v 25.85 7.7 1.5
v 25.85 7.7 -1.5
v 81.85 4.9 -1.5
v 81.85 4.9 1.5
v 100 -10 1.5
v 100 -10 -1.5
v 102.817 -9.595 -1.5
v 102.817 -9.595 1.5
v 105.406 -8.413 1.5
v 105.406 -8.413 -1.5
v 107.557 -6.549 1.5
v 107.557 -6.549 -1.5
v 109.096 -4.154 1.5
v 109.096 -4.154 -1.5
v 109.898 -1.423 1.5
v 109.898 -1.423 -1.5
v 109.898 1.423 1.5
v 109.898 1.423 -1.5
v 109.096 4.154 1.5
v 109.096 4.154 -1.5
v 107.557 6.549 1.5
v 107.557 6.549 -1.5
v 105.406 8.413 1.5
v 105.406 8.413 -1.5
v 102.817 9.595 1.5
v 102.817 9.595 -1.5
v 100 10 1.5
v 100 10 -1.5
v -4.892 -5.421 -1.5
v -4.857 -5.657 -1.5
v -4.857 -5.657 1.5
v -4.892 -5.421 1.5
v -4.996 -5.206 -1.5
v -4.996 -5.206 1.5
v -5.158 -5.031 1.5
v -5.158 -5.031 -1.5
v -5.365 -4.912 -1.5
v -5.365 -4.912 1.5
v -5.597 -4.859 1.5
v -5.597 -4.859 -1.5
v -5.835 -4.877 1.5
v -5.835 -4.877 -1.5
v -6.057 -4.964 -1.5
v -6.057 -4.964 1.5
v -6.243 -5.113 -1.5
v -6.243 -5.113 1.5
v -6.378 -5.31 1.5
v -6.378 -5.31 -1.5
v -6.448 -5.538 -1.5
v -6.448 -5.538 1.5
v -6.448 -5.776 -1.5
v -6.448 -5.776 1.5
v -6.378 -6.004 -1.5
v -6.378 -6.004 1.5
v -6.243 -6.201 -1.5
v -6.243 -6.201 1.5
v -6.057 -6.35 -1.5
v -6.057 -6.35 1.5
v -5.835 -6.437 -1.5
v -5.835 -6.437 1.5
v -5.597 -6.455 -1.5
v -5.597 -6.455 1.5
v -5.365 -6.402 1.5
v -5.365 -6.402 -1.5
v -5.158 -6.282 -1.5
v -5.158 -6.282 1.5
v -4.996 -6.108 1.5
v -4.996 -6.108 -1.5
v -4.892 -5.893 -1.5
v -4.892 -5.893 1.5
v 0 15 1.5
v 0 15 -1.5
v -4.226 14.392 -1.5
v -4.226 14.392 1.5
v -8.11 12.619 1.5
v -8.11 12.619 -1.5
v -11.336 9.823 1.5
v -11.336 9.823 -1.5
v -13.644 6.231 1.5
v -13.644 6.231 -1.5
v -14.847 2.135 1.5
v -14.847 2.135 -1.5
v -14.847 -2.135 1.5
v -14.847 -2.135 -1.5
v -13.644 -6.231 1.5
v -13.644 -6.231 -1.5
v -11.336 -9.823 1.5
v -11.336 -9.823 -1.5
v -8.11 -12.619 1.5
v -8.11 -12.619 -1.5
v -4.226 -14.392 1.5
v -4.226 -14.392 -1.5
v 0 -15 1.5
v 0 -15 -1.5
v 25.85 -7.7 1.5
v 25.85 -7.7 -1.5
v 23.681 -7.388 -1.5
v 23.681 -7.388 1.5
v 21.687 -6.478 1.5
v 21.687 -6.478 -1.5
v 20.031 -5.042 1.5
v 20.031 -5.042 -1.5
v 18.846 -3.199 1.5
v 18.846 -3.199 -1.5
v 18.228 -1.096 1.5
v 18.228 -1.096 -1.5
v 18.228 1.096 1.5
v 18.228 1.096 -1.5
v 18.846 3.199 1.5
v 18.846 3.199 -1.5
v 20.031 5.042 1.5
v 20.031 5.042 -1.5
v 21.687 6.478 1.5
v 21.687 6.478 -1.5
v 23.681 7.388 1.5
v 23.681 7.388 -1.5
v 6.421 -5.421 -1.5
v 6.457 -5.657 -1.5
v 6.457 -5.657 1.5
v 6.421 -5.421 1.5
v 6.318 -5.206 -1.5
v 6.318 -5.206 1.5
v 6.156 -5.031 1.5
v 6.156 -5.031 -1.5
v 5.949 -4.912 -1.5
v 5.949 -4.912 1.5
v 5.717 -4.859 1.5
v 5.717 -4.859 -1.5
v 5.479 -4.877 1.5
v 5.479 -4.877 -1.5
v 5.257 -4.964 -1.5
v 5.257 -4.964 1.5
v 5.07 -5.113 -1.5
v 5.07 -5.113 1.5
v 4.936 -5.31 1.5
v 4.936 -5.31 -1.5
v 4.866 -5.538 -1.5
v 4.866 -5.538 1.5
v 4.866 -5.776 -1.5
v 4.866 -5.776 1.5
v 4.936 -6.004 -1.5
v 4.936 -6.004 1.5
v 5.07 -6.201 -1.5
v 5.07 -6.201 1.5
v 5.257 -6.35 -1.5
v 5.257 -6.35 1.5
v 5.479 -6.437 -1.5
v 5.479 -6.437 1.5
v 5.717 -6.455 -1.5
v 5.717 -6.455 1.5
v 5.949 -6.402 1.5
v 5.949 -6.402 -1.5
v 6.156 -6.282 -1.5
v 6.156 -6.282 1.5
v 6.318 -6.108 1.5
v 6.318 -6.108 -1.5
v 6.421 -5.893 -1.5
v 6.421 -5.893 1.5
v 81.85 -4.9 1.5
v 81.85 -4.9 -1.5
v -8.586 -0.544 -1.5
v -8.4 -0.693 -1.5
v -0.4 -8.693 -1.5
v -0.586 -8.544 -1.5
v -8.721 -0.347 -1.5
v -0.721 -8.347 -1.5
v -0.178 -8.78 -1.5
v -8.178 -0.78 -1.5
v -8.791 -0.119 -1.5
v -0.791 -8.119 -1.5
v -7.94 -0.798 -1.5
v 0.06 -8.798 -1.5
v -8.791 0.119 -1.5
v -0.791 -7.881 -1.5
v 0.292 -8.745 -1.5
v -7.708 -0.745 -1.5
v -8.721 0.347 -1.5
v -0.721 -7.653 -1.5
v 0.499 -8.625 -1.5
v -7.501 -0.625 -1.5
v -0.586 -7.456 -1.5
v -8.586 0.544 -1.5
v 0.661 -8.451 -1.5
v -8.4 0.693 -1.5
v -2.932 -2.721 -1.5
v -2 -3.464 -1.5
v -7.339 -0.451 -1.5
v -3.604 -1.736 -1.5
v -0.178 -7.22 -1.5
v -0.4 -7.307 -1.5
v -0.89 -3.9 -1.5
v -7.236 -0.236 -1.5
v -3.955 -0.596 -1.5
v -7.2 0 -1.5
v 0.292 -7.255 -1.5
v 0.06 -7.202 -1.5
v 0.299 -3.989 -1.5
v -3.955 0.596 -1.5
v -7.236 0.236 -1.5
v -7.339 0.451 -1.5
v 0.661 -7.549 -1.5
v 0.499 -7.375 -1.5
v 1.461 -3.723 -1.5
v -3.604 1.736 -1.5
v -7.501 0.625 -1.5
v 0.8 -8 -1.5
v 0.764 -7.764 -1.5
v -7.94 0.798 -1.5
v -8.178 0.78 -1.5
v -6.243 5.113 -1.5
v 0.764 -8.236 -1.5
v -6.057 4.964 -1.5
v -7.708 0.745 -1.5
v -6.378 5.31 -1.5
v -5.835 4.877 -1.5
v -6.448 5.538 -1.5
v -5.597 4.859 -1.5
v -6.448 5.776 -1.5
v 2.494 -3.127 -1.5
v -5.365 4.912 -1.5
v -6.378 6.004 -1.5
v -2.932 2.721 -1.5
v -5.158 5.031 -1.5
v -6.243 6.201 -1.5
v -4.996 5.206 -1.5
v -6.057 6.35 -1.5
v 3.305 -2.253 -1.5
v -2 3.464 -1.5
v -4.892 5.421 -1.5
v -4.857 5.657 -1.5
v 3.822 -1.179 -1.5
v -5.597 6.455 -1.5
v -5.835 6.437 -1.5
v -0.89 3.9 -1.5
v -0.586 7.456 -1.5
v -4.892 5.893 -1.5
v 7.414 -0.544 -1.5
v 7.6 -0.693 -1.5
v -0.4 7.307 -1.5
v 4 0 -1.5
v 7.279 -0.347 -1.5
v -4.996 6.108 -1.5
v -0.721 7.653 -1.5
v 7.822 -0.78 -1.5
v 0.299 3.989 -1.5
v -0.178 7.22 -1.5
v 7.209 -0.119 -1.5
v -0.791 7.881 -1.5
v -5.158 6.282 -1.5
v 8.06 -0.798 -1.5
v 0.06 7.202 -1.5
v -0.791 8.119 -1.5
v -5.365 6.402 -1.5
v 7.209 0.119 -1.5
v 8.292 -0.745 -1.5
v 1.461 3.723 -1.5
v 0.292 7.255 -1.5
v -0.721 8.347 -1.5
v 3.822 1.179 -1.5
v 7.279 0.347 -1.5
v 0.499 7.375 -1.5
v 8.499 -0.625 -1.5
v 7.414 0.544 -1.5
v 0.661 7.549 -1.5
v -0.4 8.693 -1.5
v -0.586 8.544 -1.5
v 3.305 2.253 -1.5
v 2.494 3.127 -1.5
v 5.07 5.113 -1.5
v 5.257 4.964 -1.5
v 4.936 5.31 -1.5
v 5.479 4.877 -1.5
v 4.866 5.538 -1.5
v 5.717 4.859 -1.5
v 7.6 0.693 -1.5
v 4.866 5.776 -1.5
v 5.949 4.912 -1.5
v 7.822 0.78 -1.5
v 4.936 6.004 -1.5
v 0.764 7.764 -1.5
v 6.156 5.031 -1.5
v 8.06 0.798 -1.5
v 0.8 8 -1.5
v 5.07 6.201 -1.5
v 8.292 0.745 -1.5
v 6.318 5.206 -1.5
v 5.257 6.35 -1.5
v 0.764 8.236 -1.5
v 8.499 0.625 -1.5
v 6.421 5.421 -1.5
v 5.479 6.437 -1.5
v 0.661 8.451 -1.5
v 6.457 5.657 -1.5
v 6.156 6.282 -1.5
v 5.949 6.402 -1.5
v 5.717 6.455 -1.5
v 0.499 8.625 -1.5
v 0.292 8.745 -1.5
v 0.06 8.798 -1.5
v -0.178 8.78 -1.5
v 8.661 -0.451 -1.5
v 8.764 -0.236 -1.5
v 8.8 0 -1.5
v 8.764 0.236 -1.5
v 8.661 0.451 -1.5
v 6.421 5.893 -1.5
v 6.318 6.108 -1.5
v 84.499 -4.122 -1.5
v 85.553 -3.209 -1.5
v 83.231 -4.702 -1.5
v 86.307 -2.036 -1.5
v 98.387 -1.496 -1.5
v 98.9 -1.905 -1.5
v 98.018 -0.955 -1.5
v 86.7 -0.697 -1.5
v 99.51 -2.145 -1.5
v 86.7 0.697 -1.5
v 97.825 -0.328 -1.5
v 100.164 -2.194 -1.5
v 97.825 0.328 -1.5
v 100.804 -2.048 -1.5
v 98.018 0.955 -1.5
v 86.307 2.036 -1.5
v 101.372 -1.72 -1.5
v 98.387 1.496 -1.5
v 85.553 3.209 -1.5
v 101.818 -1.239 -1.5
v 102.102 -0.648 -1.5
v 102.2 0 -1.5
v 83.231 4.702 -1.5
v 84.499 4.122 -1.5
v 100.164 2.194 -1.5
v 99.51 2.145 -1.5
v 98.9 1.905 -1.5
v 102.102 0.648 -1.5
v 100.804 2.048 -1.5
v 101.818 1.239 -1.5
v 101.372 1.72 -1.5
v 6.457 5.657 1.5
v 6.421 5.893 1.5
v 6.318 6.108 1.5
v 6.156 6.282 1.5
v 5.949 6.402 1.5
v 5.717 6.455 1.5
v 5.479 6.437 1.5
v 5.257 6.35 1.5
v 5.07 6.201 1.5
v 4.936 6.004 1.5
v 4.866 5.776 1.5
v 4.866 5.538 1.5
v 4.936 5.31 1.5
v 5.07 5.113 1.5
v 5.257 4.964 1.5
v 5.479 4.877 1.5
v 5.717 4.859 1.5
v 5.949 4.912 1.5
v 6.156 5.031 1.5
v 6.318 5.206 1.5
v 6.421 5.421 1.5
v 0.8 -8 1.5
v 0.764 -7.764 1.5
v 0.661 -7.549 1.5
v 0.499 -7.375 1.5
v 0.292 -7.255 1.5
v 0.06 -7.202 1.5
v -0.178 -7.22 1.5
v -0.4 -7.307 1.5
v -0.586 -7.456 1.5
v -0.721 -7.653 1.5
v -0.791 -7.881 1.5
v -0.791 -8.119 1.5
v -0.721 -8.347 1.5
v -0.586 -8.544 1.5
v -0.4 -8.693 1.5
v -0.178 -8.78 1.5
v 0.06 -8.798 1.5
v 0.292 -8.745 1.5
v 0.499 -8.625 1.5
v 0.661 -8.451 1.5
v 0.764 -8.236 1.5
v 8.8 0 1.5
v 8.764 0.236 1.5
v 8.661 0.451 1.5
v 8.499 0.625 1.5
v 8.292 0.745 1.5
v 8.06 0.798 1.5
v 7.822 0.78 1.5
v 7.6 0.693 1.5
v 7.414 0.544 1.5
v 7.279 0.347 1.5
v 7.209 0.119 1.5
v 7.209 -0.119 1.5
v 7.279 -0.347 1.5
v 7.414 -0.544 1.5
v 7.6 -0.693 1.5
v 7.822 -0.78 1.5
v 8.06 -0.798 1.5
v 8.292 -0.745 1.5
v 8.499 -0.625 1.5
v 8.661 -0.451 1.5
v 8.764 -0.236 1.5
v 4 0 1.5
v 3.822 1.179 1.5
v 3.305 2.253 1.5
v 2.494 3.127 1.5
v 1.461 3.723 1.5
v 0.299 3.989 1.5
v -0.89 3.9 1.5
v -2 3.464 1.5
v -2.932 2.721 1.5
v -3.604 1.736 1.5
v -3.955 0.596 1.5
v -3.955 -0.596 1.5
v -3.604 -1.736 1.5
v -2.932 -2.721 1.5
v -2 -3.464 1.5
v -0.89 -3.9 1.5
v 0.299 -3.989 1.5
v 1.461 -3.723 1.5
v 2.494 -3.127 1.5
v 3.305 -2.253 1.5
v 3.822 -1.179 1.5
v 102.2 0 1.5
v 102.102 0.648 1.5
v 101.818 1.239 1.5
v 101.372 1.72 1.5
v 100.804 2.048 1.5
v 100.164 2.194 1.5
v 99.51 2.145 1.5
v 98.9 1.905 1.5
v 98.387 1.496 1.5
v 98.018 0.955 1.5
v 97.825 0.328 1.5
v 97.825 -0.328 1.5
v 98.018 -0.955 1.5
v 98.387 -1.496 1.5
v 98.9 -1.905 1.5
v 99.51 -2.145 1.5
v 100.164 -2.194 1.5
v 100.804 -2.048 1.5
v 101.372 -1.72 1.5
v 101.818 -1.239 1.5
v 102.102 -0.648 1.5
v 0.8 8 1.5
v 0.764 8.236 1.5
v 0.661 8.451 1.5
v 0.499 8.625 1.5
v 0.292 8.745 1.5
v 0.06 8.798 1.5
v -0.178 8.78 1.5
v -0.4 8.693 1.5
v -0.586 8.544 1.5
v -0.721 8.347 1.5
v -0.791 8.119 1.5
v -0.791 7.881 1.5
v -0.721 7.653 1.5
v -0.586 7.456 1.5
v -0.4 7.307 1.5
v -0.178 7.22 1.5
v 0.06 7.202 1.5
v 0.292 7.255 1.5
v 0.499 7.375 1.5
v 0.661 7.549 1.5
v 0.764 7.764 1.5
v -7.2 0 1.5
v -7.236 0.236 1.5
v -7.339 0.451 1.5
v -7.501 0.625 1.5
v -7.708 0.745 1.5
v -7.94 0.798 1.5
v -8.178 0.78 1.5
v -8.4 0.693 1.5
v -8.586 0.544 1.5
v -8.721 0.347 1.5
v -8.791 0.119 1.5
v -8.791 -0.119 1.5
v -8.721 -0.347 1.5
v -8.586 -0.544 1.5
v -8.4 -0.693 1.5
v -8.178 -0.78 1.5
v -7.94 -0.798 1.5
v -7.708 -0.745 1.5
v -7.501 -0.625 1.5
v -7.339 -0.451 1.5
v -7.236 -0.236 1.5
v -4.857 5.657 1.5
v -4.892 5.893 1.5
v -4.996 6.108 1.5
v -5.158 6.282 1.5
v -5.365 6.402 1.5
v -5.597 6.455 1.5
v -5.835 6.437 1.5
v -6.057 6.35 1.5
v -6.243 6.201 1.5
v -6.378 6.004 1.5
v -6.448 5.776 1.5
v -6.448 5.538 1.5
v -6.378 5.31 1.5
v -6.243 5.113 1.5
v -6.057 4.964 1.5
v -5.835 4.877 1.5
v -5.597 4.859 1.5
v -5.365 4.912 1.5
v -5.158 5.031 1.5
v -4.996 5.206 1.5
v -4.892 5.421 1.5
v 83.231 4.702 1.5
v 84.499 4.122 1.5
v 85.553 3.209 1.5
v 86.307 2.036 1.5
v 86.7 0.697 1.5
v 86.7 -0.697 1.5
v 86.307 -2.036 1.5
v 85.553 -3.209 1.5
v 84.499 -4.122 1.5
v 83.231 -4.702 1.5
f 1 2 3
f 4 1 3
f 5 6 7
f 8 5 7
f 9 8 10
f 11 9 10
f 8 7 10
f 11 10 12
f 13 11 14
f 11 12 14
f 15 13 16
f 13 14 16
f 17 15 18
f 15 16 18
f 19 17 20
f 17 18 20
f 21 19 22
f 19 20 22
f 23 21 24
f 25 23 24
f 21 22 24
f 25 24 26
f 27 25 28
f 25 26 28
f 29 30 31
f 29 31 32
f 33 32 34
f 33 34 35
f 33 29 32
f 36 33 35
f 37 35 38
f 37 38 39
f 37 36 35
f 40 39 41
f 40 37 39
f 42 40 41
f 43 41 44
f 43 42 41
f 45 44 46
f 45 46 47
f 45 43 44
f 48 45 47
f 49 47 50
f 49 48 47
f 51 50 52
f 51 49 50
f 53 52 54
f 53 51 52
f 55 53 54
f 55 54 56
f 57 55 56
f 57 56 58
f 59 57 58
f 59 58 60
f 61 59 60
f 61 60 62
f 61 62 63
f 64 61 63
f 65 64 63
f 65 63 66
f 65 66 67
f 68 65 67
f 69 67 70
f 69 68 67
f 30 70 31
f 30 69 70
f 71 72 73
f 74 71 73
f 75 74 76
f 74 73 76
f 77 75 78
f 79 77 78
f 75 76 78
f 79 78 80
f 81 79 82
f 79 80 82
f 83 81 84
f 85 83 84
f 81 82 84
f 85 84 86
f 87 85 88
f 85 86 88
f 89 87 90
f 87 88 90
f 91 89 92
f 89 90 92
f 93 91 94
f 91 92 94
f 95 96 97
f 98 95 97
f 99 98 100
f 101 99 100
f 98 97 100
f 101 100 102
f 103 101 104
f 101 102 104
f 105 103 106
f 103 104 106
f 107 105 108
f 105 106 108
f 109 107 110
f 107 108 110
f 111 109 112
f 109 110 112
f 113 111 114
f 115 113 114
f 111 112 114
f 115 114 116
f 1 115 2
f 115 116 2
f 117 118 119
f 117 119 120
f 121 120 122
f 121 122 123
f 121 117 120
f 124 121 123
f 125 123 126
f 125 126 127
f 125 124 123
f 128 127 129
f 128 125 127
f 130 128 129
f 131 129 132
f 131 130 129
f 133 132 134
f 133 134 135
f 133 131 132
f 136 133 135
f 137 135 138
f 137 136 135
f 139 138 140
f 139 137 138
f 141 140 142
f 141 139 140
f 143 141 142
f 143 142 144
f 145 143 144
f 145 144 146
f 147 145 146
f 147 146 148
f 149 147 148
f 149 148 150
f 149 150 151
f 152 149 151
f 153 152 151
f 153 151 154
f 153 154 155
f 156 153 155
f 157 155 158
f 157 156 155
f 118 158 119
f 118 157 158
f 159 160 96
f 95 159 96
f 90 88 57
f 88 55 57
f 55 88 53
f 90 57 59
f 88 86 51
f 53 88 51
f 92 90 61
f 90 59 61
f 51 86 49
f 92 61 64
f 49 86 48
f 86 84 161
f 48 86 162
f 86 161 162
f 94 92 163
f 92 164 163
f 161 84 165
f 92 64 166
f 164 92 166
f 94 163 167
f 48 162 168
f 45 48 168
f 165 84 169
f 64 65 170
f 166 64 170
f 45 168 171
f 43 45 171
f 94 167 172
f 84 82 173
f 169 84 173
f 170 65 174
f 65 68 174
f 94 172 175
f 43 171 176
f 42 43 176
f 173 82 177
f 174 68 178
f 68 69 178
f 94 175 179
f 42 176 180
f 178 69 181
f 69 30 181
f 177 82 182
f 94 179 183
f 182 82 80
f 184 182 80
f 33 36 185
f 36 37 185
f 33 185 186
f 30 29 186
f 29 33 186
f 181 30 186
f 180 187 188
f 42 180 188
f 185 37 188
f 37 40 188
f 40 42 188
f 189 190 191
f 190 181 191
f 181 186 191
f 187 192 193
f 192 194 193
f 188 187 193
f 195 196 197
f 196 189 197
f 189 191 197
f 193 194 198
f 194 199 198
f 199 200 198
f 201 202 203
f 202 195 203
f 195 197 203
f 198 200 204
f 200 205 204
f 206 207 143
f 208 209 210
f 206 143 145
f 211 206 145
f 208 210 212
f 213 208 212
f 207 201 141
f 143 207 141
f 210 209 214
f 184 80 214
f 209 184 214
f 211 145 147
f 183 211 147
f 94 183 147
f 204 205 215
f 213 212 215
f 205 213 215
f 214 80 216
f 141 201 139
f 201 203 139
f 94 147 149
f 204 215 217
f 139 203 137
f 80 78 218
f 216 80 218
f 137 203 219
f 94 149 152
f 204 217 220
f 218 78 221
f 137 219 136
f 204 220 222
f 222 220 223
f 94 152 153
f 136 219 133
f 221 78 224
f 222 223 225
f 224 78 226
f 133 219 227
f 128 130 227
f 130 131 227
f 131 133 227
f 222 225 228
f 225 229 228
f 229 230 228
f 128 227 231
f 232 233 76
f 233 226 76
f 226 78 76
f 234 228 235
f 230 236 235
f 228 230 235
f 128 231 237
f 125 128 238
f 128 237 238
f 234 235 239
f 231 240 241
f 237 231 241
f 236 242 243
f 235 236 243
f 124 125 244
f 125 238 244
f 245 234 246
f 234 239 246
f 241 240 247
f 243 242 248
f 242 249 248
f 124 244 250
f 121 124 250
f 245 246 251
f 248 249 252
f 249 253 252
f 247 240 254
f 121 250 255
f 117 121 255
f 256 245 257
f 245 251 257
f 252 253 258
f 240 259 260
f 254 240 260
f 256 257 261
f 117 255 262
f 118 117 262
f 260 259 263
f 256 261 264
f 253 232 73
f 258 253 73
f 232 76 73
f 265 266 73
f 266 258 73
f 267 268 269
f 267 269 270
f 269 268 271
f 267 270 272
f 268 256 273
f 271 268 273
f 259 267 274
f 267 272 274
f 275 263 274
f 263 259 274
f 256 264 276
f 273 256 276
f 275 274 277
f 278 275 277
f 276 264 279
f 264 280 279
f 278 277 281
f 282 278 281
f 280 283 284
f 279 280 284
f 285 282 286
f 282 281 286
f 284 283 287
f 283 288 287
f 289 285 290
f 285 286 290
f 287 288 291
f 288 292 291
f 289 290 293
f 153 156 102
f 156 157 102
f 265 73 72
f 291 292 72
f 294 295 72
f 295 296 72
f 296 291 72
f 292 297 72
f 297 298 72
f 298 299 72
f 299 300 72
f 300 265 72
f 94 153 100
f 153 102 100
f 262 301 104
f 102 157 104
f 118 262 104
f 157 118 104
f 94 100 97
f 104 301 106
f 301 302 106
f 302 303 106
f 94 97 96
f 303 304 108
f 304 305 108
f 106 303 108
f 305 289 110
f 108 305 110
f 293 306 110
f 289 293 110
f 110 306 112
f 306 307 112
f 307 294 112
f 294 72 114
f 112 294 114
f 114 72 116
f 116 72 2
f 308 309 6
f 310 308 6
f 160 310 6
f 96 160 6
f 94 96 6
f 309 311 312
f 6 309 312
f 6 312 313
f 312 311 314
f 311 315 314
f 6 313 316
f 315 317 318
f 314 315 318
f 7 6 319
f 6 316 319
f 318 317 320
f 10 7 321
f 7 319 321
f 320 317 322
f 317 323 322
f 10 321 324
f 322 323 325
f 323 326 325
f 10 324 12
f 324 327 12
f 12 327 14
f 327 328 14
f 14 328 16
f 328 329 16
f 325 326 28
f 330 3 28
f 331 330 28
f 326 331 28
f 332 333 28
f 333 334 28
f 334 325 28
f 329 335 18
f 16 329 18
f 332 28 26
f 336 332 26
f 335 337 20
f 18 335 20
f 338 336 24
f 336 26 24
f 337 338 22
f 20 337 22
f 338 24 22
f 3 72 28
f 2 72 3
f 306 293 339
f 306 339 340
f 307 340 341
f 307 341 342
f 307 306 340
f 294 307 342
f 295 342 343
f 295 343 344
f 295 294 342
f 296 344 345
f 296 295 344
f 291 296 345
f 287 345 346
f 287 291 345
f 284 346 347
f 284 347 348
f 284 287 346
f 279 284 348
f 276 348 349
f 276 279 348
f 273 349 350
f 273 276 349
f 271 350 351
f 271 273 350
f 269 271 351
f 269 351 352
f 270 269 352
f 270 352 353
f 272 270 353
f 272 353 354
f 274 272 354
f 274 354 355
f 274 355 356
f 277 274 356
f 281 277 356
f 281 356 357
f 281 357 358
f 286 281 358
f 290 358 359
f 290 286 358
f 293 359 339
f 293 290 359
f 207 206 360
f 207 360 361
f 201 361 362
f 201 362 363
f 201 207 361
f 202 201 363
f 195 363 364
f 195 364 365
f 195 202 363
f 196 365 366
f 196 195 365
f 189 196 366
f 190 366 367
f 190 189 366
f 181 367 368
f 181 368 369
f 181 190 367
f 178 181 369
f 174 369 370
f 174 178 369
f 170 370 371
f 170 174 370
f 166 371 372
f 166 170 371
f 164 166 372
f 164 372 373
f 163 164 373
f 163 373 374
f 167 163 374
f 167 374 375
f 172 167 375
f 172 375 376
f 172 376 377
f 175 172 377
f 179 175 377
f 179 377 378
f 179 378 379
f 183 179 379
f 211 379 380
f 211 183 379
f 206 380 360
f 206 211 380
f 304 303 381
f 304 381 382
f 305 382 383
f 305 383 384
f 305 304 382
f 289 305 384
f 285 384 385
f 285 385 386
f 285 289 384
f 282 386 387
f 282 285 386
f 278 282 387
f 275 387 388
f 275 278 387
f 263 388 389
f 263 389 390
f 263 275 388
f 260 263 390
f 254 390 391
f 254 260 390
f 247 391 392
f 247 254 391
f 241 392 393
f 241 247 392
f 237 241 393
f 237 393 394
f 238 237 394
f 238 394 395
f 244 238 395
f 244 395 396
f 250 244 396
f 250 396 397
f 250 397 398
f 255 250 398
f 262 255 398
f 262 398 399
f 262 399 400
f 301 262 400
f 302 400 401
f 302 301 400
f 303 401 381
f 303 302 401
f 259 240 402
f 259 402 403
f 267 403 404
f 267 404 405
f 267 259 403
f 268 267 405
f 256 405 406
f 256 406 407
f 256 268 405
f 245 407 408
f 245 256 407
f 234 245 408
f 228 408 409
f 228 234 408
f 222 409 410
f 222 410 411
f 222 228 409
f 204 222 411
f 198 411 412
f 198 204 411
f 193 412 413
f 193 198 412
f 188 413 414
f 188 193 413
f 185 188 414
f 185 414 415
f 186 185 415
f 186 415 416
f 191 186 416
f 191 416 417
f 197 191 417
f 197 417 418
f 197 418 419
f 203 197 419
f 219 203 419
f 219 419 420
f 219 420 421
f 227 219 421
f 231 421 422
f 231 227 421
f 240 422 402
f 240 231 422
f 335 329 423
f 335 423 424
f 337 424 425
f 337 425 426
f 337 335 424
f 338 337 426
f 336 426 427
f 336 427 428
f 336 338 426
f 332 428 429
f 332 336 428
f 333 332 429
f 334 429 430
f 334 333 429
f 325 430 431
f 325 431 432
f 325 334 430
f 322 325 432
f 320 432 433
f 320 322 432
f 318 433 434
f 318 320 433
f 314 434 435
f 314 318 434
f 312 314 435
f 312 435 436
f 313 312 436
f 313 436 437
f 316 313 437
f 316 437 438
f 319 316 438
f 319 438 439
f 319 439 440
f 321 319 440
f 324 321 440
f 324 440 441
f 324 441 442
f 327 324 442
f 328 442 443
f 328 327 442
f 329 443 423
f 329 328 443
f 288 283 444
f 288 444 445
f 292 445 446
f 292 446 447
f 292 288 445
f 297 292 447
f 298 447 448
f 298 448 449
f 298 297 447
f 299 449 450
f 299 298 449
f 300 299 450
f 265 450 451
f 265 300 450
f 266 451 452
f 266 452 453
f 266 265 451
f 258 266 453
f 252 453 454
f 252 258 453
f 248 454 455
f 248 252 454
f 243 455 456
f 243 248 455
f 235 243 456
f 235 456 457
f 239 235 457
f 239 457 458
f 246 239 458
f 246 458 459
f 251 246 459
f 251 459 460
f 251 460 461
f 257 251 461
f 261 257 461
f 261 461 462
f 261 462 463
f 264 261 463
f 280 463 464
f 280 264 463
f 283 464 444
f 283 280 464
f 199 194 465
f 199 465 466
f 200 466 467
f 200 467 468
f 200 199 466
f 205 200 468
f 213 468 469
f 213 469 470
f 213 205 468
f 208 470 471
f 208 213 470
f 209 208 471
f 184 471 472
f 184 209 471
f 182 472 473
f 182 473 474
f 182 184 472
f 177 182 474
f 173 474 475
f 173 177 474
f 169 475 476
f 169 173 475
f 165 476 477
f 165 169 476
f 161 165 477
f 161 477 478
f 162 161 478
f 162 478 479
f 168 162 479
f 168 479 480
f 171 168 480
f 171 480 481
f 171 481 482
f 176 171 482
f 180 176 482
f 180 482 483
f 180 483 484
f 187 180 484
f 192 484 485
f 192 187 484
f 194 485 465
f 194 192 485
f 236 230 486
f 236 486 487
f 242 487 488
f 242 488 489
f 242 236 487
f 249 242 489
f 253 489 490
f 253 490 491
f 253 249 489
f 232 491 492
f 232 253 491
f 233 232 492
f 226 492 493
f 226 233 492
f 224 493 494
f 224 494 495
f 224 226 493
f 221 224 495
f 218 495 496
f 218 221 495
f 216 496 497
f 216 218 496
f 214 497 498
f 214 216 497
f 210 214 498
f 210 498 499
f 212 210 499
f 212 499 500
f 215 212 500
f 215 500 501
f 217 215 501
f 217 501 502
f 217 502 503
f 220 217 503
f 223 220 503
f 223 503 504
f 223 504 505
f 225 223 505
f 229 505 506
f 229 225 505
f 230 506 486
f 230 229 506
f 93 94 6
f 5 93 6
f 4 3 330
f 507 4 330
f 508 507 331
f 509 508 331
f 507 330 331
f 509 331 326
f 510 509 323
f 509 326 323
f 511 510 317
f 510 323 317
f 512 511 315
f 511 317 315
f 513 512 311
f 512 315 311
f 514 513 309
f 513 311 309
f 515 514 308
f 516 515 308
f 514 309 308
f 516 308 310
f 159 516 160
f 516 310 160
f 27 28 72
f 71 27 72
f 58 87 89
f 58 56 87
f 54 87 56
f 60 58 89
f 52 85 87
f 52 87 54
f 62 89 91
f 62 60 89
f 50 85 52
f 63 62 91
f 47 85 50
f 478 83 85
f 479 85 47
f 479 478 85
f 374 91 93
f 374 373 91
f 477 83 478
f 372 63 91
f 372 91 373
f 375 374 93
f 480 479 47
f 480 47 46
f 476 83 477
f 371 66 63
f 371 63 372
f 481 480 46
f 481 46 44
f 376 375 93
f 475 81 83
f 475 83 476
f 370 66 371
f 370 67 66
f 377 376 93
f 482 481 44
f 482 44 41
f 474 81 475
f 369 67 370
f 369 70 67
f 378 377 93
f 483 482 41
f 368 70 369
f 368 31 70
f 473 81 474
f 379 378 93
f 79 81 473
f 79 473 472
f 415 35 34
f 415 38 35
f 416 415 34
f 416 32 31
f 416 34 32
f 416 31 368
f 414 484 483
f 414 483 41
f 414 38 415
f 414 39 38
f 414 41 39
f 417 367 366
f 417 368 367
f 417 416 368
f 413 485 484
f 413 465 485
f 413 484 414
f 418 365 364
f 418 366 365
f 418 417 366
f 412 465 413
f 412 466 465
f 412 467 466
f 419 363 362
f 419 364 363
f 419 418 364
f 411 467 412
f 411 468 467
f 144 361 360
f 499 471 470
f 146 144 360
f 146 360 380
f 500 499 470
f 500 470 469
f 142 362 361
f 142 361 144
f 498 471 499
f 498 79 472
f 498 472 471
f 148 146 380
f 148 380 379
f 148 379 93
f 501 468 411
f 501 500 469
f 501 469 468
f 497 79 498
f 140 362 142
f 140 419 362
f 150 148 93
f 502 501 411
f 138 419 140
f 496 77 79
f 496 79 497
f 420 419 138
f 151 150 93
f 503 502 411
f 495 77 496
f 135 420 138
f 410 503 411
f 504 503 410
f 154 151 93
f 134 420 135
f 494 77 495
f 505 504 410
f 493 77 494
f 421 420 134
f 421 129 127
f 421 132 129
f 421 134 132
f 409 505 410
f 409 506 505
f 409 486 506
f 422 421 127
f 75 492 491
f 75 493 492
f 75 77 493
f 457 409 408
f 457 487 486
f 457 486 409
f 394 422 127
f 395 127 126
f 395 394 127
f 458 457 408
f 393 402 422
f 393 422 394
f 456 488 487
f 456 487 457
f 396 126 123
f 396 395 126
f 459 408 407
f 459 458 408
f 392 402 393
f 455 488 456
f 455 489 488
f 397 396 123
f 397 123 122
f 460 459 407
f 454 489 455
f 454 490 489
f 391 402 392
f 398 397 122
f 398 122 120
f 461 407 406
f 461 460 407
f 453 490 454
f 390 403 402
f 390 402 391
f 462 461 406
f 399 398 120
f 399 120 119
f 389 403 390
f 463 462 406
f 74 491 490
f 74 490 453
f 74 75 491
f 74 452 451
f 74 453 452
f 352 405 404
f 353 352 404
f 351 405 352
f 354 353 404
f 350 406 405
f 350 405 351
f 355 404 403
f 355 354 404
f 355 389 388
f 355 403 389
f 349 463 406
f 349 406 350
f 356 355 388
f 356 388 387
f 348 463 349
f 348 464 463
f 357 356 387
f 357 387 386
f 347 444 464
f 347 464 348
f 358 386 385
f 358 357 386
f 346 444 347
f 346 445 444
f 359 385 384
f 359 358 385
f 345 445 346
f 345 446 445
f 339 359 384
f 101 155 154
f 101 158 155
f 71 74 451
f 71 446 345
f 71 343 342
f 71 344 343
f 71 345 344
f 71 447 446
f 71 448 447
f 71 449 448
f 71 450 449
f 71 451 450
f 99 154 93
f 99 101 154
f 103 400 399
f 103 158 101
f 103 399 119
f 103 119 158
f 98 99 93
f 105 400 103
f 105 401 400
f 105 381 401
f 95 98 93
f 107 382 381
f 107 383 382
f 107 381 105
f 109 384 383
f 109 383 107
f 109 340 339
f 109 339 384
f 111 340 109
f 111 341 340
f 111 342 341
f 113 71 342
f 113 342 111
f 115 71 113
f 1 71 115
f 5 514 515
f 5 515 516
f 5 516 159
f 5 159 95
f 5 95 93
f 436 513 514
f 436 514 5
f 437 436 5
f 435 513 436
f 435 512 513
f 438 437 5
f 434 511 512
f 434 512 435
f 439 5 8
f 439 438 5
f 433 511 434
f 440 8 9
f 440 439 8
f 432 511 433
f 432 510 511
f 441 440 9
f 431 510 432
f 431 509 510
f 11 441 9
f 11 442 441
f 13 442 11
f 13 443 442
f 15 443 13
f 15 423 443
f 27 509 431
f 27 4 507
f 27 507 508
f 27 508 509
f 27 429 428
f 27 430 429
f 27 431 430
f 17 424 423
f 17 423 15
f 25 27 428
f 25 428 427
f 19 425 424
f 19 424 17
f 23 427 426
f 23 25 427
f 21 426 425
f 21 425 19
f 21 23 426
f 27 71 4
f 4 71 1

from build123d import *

# Parameters (mm, degrees)
BOSS_EXTRU_1_DEPTH      = 1.5
BOSS_EXTRU_1_DEPTH_BACK = 1.5
ESQUISSE1_R             = 0.8
ESQUISSE1_R_2           = 2.2
ESQUISSE1_R_3           = 4


with BuildPart() as part:
    # Esquisse1 → Boss.-Extru.1 (new, two sides: drawn at the far end of the back side and taken through both)
    with BuildSketch(Plane.XY.offset(-BOSS_EXTRU_1_DEPTH_BACK)):
        with BuildLine():
            Line((0, -15), (100, -10))
            ThreePointArc((100, -10), (110, 0), (100, 10))
            Line((100, 10), (0, 15))
            ThreePointArc((0, 15), (-15, 0), (0, -15))
        make_face()
        with Locations((5.656854249, 5.656854249)):
            Circle(ESQUISSE1_R, mode=Mode.SUBTRACT)
        with Locations((8, 0)):
            Circle(ESQUISSE1_R, mode=Mode.SUBTRACT)
        with Locations((5.656854249, -5.656854249)):
            Circle(ESQUISSE1_R, mode=Mode.SUBTRACT)
        with Locations((0, -8)):
            Circle(ESQUISSE1_R, mode=Mode.SUBTRACT)
        with Locations((100, 0)):
            Circle(ESQUISSE1_R_2, mode=Mode.SUBTRACT)
        Circle(ESQUISSE1_R_3, mode=Mode.SUBTRACT)
        with Locations((-5.656854249, -5.656854249)):
            Circle(ESQUISSE1_R, mode=Mode.SUBTRACT)
        with Locations((-8, 0)):
            Circle(ESQUISSE1_R, mode=Mode.SUBTRACT)
        with Locations((-5.656854249, 5.656854249)):
            Circle(ESQUISSE1_R, mode=Mode.SUBTRACT)
        with Locations((0, 8)):
            Circle(ESQUISSE1_R, mode=Mode.SUBTRACT)
        with BuildLine():
            Line((25.850093633, 7.7), (81.850093633, 4.9))
            ThreePointArc((81.850093633, 4.9), (86.750093633, 0), (81.850093633, -4.9))
            Line((81.850093633, -4.9), (25.850093633, -7.7))
            ThreePointArc((25.850093633, -7.7), (18.150093633, 0), (25.850093633, 7.7))
        make_face(mode=Mode.SUBTRACT)
    extrude(amount=BOSS_EXTRU_1_DEPTH + BOSS_EXTRU_1_DEPTH_BACK)


solid = part.part
